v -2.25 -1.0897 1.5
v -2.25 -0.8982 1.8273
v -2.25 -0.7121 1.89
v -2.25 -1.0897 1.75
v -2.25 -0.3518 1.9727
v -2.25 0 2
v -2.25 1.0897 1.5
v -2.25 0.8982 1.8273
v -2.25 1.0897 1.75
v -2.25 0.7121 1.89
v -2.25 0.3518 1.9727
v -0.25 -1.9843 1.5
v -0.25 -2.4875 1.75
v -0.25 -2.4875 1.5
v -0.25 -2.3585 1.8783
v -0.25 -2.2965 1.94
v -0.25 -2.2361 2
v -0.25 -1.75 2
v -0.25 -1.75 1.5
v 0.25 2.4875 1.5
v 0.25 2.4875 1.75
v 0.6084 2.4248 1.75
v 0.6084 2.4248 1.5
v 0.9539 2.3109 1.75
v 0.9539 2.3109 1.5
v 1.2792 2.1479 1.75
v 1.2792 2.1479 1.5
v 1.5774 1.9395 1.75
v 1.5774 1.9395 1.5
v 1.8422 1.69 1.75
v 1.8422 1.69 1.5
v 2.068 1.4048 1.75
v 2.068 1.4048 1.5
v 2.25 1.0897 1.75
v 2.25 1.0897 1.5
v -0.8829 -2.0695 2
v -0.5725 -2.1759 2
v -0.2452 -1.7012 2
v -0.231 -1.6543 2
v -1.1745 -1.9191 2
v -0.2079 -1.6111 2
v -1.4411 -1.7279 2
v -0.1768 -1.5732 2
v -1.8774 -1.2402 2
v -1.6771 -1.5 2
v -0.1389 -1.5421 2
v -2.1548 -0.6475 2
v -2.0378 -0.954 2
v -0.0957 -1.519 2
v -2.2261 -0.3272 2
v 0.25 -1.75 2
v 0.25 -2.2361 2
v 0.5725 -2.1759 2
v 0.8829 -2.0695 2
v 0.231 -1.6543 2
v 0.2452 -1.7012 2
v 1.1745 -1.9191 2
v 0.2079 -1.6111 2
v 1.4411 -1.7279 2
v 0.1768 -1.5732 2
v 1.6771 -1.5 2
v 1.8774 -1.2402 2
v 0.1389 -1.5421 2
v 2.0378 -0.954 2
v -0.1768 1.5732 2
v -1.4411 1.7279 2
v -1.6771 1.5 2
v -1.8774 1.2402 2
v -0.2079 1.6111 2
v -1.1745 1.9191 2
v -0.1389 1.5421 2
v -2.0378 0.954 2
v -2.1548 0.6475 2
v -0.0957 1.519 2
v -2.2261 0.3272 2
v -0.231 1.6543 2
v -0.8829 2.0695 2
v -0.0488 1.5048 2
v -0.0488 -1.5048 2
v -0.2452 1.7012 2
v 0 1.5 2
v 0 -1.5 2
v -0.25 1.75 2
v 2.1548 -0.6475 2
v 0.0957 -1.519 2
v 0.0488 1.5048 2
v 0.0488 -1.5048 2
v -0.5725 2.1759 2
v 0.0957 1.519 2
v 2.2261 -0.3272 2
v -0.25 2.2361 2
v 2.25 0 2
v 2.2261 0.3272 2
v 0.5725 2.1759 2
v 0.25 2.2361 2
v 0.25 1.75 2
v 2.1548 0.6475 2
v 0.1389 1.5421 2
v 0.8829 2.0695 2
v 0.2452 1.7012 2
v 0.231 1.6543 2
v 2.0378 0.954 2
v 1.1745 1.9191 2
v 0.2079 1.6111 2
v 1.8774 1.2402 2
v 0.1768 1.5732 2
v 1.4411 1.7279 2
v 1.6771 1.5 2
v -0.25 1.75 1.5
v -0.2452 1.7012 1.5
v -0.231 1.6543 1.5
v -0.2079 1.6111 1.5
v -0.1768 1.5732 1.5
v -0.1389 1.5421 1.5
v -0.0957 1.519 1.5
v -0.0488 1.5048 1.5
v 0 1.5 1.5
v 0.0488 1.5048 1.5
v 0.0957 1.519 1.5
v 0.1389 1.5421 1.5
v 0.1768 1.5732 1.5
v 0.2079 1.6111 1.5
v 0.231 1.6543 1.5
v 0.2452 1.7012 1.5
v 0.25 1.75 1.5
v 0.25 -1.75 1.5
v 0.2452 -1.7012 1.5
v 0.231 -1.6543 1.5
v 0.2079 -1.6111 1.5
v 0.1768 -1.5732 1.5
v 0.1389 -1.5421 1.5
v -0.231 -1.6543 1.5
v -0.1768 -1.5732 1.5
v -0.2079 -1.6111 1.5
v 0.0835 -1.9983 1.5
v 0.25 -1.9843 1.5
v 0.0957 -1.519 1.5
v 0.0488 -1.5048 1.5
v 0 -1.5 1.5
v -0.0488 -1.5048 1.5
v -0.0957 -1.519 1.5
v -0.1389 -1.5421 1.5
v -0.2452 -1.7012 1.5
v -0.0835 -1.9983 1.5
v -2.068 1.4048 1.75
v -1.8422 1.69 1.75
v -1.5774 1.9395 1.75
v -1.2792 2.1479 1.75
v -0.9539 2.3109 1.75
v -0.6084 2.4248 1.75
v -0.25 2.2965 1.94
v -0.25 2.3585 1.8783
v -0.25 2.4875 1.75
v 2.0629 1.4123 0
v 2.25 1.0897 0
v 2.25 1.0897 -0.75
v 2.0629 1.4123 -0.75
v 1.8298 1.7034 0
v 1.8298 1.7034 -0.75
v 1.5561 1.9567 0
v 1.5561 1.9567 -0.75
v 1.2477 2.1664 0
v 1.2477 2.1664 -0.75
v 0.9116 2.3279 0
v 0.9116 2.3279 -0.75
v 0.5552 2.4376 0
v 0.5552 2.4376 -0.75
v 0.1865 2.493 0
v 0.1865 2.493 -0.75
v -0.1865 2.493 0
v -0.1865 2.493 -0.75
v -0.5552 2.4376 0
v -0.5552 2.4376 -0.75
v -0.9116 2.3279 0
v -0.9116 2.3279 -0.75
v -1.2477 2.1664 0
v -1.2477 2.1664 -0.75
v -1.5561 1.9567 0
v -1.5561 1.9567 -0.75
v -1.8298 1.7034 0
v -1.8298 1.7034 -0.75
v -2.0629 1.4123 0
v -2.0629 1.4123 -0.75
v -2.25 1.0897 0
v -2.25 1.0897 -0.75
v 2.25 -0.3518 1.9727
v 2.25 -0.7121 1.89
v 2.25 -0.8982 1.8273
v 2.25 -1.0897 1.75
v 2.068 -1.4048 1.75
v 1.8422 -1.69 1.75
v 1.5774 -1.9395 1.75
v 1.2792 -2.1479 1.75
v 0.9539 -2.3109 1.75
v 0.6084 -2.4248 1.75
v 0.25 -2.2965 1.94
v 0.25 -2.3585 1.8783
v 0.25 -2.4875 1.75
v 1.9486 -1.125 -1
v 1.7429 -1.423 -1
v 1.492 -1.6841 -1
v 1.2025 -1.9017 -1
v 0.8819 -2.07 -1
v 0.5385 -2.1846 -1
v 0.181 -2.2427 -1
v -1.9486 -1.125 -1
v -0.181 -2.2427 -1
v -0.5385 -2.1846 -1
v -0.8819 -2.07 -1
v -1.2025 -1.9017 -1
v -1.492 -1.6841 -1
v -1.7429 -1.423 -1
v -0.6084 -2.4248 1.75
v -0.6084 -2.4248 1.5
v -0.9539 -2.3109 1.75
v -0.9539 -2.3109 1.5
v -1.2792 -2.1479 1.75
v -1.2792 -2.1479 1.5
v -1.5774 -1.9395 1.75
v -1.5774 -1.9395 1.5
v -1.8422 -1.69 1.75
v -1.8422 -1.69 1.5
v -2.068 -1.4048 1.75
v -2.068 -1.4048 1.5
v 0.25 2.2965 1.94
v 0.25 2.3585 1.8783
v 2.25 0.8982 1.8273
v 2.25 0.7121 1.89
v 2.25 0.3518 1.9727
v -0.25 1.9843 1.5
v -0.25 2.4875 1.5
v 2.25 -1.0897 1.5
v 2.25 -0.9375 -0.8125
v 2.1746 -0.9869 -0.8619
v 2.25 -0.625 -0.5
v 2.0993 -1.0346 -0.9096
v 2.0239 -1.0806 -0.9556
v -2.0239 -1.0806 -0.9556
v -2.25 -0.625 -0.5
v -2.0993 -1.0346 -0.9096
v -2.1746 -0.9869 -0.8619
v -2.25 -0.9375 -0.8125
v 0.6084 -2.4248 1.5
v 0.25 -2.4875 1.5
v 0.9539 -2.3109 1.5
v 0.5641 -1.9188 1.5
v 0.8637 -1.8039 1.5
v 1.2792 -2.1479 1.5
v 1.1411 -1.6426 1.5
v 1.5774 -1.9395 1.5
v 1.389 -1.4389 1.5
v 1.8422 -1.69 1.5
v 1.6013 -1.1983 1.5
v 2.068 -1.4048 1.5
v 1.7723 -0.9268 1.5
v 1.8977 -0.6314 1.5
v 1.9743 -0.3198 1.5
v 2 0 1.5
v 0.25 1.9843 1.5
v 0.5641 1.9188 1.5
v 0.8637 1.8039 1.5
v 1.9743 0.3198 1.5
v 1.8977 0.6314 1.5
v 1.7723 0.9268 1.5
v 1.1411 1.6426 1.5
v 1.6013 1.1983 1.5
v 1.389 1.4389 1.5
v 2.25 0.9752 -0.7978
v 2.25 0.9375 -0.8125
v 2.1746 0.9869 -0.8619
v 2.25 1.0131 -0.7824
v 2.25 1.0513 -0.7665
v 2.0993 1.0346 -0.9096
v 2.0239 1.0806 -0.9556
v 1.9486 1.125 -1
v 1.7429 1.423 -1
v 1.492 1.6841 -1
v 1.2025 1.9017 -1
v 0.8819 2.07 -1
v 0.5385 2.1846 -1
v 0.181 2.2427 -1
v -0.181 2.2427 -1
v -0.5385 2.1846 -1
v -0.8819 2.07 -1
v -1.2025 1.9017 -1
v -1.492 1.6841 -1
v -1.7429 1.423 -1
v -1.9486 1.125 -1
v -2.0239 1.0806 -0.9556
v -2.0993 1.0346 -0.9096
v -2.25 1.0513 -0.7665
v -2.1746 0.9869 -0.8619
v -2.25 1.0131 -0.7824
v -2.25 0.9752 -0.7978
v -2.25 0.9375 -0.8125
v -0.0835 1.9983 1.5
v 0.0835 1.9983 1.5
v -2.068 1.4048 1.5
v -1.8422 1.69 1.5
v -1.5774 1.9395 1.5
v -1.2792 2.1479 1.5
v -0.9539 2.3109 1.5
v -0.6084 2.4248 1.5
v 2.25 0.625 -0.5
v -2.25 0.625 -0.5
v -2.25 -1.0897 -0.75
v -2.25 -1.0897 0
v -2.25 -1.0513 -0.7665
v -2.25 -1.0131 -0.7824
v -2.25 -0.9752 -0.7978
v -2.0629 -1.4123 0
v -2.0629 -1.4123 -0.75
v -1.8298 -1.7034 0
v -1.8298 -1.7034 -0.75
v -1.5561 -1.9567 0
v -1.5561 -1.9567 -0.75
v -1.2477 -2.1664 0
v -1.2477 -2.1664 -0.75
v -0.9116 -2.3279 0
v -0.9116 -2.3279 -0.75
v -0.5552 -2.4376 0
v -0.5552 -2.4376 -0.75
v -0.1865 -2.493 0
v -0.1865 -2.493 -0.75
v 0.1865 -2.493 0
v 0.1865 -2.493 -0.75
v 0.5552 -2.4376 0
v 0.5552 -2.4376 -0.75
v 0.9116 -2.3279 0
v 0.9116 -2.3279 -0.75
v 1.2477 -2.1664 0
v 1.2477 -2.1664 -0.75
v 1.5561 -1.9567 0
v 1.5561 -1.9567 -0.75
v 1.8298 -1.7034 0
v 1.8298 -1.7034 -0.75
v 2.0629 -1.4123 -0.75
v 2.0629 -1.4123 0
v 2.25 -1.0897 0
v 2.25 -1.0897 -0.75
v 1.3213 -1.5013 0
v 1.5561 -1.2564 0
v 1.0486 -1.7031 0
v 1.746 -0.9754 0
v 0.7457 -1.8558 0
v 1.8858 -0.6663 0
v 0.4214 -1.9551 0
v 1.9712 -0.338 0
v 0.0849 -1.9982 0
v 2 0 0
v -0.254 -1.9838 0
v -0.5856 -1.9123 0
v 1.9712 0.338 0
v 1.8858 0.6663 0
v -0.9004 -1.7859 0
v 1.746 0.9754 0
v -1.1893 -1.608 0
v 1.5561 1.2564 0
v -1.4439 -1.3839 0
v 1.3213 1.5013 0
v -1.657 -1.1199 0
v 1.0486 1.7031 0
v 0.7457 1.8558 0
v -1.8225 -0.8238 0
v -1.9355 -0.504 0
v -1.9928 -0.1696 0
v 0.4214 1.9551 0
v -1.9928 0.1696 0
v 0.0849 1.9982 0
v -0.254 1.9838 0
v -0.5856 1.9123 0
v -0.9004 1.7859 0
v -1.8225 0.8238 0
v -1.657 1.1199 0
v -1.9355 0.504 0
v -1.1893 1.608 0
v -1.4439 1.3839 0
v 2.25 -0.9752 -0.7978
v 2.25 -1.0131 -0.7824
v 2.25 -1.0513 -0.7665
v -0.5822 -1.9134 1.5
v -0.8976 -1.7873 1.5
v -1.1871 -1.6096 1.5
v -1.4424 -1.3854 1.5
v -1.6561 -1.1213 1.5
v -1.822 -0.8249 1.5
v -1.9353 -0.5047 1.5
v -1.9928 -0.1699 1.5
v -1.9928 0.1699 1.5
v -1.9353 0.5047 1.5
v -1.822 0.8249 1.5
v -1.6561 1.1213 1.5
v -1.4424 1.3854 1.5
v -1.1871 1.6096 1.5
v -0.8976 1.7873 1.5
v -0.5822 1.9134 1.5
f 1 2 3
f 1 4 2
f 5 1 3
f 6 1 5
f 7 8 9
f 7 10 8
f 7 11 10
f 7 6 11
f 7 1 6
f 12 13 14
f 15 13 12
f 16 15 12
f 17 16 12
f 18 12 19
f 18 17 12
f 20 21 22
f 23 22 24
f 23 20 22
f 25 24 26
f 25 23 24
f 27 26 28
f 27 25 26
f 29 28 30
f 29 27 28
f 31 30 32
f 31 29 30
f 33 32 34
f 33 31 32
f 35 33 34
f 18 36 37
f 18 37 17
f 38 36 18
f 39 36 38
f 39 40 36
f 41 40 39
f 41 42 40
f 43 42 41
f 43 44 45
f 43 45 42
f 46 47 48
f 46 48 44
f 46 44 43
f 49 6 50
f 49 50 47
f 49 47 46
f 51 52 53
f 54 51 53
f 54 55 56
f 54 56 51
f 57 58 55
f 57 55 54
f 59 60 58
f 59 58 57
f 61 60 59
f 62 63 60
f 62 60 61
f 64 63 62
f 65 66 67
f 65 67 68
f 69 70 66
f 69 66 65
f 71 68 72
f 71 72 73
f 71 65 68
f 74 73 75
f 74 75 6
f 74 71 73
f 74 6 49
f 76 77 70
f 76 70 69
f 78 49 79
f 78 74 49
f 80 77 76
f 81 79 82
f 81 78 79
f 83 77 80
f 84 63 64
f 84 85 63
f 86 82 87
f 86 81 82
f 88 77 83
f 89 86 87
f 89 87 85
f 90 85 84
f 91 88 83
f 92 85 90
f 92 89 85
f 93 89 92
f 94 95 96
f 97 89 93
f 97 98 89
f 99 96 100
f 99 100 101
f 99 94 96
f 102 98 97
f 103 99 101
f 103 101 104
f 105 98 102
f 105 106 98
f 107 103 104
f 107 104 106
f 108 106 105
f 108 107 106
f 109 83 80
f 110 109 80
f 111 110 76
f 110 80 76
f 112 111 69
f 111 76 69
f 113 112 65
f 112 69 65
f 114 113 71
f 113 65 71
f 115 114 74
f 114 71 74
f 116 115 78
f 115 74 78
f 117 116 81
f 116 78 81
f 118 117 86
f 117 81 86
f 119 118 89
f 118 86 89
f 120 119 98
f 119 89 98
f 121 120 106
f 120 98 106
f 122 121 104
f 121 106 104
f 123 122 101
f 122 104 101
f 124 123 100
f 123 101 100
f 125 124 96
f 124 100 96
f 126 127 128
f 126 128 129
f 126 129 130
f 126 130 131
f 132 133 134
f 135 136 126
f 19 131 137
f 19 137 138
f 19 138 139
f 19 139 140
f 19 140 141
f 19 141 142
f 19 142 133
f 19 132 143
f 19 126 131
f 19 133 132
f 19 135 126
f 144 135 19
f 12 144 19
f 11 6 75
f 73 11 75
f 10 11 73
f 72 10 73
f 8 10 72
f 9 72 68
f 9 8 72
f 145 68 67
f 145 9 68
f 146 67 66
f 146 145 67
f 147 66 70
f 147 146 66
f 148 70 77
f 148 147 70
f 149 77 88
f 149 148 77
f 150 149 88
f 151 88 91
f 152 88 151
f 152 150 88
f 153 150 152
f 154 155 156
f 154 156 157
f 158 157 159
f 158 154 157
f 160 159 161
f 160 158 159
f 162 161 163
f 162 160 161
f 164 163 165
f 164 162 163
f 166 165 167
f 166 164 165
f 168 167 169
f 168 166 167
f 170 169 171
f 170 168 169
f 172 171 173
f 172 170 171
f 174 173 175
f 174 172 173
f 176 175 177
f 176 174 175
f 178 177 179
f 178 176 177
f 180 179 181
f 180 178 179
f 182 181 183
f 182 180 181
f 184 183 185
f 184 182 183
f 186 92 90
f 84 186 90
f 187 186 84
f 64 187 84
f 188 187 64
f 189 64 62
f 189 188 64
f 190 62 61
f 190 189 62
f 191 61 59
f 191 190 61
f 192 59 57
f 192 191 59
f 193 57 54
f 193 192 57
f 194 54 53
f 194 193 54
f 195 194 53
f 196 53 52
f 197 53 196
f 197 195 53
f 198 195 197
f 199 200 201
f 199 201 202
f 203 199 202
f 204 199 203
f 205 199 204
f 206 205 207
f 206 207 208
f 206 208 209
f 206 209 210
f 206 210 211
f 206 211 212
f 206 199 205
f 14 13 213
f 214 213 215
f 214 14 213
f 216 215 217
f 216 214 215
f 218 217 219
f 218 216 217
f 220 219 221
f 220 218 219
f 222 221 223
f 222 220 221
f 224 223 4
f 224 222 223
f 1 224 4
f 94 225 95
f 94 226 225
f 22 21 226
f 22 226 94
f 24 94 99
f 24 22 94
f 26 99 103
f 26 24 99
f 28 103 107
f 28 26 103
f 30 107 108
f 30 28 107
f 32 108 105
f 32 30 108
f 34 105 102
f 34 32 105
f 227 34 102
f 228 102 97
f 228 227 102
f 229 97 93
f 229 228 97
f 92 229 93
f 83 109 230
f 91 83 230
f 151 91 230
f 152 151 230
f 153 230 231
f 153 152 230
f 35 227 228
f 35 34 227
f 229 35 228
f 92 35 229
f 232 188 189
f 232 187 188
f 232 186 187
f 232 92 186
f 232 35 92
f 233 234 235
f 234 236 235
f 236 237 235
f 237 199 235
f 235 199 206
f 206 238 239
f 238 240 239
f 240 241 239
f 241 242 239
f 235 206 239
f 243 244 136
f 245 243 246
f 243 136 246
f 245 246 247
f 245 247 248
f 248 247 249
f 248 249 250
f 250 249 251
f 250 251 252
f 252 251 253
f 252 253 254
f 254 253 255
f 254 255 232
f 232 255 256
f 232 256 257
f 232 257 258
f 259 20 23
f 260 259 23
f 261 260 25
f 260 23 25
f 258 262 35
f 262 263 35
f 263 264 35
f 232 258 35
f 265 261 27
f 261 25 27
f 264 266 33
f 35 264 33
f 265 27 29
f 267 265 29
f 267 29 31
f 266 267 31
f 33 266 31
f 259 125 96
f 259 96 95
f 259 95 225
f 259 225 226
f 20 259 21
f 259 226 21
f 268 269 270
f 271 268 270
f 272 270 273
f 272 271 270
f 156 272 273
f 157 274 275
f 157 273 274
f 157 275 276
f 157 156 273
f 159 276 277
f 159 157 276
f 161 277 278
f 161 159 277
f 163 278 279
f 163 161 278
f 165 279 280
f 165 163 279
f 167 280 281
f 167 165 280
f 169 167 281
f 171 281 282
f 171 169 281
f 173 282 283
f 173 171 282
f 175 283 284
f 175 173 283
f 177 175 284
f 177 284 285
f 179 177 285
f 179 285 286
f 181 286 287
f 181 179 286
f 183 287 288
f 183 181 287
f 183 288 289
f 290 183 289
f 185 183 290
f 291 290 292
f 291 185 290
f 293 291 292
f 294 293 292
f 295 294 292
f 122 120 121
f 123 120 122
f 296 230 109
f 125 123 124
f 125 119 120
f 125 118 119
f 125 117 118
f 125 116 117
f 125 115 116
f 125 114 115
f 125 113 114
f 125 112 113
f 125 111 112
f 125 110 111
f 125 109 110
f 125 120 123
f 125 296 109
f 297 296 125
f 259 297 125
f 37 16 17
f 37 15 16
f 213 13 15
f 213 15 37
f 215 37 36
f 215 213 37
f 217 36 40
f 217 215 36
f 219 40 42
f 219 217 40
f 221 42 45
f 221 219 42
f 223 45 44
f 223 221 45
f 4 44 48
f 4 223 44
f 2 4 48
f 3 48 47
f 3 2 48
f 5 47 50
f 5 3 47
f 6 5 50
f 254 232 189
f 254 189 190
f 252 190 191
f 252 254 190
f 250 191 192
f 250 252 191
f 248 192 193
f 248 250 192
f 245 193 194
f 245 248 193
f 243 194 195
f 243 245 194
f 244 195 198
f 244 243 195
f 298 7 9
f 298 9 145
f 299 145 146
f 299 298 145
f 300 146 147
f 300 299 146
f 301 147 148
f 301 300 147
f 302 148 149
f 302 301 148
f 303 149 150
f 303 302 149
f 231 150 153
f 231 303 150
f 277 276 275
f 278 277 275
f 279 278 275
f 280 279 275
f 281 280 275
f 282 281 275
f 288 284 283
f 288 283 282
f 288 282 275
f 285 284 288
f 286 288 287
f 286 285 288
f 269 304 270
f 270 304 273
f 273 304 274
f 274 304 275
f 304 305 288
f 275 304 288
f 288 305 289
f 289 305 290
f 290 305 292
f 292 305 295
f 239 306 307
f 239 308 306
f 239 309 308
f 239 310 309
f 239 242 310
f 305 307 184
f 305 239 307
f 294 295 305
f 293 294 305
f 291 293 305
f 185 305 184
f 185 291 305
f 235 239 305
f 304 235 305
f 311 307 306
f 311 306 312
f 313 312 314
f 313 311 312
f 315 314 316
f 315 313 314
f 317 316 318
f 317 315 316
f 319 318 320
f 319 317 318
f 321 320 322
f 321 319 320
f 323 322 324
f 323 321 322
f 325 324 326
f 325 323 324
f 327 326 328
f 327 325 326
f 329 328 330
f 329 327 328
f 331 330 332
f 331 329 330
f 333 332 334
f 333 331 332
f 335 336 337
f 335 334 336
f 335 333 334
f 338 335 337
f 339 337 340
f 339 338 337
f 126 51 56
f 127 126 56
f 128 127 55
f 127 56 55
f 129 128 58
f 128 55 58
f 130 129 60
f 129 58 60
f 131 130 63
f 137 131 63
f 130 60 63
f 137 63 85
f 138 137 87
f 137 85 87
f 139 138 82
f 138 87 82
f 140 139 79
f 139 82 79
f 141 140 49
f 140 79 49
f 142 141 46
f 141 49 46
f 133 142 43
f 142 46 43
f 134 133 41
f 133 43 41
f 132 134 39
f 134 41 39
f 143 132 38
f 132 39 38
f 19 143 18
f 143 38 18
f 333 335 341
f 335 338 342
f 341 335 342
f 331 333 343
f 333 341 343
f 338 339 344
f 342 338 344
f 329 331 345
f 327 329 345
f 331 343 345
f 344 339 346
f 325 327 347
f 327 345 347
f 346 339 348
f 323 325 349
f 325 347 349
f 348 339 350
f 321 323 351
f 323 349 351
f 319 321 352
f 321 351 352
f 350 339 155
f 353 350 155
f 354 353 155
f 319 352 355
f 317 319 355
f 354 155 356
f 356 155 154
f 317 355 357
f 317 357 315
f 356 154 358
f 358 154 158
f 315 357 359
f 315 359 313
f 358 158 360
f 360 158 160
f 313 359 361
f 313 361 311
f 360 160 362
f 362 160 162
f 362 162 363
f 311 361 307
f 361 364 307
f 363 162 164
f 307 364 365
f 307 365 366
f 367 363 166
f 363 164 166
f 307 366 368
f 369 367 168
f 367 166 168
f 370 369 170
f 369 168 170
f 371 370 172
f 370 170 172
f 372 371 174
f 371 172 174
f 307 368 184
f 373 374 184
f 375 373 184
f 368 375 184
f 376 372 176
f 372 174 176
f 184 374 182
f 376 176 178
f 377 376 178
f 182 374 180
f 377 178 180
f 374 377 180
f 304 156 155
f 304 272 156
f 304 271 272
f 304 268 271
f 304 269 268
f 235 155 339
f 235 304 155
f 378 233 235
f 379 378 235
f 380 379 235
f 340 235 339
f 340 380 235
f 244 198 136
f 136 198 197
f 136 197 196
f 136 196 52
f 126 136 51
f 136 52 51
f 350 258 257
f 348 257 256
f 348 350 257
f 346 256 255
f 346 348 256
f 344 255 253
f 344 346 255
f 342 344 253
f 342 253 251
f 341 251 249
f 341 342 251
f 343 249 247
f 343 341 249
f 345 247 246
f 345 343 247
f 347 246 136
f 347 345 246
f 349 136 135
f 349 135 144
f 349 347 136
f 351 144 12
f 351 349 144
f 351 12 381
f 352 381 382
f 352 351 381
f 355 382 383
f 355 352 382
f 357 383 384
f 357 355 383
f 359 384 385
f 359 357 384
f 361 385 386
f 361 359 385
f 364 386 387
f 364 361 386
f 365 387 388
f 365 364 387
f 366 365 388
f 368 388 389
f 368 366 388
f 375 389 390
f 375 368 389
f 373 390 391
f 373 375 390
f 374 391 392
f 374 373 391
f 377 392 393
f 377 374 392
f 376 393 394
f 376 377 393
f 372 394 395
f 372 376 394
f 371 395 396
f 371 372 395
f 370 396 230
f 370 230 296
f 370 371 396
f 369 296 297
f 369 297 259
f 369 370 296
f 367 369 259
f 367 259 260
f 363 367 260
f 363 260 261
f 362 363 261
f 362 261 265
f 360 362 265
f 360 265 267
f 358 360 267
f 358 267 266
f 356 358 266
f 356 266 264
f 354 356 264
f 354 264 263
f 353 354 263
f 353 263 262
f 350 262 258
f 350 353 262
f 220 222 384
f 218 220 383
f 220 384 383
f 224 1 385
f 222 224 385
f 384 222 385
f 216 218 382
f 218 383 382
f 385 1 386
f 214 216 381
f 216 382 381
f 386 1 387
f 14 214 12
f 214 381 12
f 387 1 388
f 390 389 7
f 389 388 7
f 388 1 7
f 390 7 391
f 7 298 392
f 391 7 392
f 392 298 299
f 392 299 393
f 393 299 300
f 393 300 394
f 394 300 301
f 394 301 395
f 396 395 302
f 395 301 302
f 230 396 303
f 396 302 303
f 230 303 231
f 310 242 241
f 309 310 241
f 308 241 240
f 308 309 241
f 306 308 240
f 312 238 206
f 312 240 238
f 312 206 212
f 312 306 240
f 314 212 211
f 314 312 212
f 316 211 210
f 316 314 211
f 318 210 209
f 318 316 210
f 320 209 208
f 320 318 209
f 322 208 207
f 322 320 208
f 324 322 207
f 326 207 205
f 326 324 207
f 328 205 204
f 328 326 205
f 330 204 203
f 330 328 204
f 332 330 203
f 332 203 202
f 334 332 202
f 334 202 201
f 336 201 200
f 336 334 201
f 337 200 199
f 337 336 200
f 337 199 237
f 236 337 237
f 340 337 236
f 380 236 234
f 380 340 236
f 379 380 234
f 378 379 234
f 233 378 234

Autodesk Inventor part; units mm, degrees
ref_plane "YZ Plane" through (0, 0, 0) normal (1, 0, 0) x (0, 1, 0)
ref_plane "XZ Plane" through (0, 0, 0) normal (0, 1, 0) x (-1, 0, 0)
ref_plane "XY Plane" through (0, 0, 0) normal (0, 0, 1) x (1, 0, 0)
sketch "Sketch1" plane through (0, 0, 0) normal (0, 0, 1) x (1, 0, 0)
  circle A0 centre (0, 0) radius 2
  dimension "d0" = 4
extrude "Extrusion1" add sketch "Sketch1" along normal blind 1.5
sketch "Sketch2" plane through (0, 0, 0) normal (0, 0, -1) x (-1, 0, 0)
  circle A0 centre (0, 0) radius 2.5
  dimension "d3" = 5
extrude "Extrusion2" add sketch "Sketch2" along normal blind 1
sketch "Sketch3" plane through (0, 0, 1.5) normal (0, 0, 1) x (1, 0, 0)
  circle A0 centre (0, 0) radius 2.5
  dimension "d6" = 5
extrude "Extrusion3" add sketch "Sketch3" along normal blind 0.5
chamfer "Chamfer1" distance 0.25 angle 45 2 edges at (-2.5, 0, 2) (2.5, 0, -1)
sketch "Sketch4" plane through (0, 0, 0) normal (1, 0, 0) x (0, 1, 0)
  line L0 (2.5, 0) -> (-2.5, 0) projected
  line L1 (-2.5, -1) -> (2.5, -1) projected
  line L2 (0, -1) -> (0, 0)
  line L3 (-1.125, -1) -> (-0.625, -0.5)
  line L4 (-0.625, -0.5) -> (0.625, -0.5)
  line L5 (0.625, -0.5) -> (1.125, -1)
  point P0 (0, -0.5)
  dimension "d14" = 1.25
extrude "Extrusion4" cut sketch "Sketch4" along normal through all both and the other way through all
sketch "Sketch5" plane through (0, 0, 2) normal (0, 0, 1) x (1, 0, 0)
  line L0 (-2.25, 5) -> (2.25, 5)
  line L1 (2.25, 5) -> (2.25, -5)
  line L2 (2.25, -5) -> (-2.25, -5)
  line L3 (-2.25, -5) -> (-2.25, 5)
  line L4 (-2.25, 5) -> (2.25, -5) construction
  line L5 (2.25, 5) -> (-2.25, -5) construction
  point P0 (0, 0)
  dimension "d18" = 4.5
  dimension "d19" = 10
extrude "Extrusion5" cut sketch "Sketch5" along normal through all both and the other way through all keep common part
sketch "Sketch6" plane through (0, 0, 2) normal (0, 0, 1) x (1, 0, 0)
  arc A0 (-2.25, 0) -> (2.25, 0) centre (0, 0) ccw projected
  arc A1 (2.25, 0) -> (-2.25, 0) centre (0, 0) ccw projected
  arc A2 (1.9486, 1.125) -> (-1.9486, 1.125) centre (0, 0) ccw projected
  line L0 (0, 2.25) -> (0, -2.25)
  circle A3 centre (0, 1.75) radius 0.25
  arc A4 (2.25, 1.0897) -> (-2.25, 1.0897) centre (0, 0) ccw projected
  line L1 (0.25, 1.75) -> (0.25, 2.4875)
  arc A5 (2.25, 1.0897) -> (-2.25, 1.0897) centre (0, 0) ccw projected
  line L2 (-0.25, 1.75) -> (-0.25, 2.4875)
  dimension "d22" = 0.5
  dimension "d24" = 0.5
extrude "Extrusion6" cut sketch "Sketch6" against normal up to surface (0.5 mm away) contours A3 L0 | L0 A3 | L2 A4 L1 A1 | A1 L0 A3 L2 | L0 A1 L1 A3
mirror "Mirror1" about plane through (0, 0, 0) normal (0, 1, 0) of "Extrusion6"
properties part number "SDR0503" material "ABS Plastic"
